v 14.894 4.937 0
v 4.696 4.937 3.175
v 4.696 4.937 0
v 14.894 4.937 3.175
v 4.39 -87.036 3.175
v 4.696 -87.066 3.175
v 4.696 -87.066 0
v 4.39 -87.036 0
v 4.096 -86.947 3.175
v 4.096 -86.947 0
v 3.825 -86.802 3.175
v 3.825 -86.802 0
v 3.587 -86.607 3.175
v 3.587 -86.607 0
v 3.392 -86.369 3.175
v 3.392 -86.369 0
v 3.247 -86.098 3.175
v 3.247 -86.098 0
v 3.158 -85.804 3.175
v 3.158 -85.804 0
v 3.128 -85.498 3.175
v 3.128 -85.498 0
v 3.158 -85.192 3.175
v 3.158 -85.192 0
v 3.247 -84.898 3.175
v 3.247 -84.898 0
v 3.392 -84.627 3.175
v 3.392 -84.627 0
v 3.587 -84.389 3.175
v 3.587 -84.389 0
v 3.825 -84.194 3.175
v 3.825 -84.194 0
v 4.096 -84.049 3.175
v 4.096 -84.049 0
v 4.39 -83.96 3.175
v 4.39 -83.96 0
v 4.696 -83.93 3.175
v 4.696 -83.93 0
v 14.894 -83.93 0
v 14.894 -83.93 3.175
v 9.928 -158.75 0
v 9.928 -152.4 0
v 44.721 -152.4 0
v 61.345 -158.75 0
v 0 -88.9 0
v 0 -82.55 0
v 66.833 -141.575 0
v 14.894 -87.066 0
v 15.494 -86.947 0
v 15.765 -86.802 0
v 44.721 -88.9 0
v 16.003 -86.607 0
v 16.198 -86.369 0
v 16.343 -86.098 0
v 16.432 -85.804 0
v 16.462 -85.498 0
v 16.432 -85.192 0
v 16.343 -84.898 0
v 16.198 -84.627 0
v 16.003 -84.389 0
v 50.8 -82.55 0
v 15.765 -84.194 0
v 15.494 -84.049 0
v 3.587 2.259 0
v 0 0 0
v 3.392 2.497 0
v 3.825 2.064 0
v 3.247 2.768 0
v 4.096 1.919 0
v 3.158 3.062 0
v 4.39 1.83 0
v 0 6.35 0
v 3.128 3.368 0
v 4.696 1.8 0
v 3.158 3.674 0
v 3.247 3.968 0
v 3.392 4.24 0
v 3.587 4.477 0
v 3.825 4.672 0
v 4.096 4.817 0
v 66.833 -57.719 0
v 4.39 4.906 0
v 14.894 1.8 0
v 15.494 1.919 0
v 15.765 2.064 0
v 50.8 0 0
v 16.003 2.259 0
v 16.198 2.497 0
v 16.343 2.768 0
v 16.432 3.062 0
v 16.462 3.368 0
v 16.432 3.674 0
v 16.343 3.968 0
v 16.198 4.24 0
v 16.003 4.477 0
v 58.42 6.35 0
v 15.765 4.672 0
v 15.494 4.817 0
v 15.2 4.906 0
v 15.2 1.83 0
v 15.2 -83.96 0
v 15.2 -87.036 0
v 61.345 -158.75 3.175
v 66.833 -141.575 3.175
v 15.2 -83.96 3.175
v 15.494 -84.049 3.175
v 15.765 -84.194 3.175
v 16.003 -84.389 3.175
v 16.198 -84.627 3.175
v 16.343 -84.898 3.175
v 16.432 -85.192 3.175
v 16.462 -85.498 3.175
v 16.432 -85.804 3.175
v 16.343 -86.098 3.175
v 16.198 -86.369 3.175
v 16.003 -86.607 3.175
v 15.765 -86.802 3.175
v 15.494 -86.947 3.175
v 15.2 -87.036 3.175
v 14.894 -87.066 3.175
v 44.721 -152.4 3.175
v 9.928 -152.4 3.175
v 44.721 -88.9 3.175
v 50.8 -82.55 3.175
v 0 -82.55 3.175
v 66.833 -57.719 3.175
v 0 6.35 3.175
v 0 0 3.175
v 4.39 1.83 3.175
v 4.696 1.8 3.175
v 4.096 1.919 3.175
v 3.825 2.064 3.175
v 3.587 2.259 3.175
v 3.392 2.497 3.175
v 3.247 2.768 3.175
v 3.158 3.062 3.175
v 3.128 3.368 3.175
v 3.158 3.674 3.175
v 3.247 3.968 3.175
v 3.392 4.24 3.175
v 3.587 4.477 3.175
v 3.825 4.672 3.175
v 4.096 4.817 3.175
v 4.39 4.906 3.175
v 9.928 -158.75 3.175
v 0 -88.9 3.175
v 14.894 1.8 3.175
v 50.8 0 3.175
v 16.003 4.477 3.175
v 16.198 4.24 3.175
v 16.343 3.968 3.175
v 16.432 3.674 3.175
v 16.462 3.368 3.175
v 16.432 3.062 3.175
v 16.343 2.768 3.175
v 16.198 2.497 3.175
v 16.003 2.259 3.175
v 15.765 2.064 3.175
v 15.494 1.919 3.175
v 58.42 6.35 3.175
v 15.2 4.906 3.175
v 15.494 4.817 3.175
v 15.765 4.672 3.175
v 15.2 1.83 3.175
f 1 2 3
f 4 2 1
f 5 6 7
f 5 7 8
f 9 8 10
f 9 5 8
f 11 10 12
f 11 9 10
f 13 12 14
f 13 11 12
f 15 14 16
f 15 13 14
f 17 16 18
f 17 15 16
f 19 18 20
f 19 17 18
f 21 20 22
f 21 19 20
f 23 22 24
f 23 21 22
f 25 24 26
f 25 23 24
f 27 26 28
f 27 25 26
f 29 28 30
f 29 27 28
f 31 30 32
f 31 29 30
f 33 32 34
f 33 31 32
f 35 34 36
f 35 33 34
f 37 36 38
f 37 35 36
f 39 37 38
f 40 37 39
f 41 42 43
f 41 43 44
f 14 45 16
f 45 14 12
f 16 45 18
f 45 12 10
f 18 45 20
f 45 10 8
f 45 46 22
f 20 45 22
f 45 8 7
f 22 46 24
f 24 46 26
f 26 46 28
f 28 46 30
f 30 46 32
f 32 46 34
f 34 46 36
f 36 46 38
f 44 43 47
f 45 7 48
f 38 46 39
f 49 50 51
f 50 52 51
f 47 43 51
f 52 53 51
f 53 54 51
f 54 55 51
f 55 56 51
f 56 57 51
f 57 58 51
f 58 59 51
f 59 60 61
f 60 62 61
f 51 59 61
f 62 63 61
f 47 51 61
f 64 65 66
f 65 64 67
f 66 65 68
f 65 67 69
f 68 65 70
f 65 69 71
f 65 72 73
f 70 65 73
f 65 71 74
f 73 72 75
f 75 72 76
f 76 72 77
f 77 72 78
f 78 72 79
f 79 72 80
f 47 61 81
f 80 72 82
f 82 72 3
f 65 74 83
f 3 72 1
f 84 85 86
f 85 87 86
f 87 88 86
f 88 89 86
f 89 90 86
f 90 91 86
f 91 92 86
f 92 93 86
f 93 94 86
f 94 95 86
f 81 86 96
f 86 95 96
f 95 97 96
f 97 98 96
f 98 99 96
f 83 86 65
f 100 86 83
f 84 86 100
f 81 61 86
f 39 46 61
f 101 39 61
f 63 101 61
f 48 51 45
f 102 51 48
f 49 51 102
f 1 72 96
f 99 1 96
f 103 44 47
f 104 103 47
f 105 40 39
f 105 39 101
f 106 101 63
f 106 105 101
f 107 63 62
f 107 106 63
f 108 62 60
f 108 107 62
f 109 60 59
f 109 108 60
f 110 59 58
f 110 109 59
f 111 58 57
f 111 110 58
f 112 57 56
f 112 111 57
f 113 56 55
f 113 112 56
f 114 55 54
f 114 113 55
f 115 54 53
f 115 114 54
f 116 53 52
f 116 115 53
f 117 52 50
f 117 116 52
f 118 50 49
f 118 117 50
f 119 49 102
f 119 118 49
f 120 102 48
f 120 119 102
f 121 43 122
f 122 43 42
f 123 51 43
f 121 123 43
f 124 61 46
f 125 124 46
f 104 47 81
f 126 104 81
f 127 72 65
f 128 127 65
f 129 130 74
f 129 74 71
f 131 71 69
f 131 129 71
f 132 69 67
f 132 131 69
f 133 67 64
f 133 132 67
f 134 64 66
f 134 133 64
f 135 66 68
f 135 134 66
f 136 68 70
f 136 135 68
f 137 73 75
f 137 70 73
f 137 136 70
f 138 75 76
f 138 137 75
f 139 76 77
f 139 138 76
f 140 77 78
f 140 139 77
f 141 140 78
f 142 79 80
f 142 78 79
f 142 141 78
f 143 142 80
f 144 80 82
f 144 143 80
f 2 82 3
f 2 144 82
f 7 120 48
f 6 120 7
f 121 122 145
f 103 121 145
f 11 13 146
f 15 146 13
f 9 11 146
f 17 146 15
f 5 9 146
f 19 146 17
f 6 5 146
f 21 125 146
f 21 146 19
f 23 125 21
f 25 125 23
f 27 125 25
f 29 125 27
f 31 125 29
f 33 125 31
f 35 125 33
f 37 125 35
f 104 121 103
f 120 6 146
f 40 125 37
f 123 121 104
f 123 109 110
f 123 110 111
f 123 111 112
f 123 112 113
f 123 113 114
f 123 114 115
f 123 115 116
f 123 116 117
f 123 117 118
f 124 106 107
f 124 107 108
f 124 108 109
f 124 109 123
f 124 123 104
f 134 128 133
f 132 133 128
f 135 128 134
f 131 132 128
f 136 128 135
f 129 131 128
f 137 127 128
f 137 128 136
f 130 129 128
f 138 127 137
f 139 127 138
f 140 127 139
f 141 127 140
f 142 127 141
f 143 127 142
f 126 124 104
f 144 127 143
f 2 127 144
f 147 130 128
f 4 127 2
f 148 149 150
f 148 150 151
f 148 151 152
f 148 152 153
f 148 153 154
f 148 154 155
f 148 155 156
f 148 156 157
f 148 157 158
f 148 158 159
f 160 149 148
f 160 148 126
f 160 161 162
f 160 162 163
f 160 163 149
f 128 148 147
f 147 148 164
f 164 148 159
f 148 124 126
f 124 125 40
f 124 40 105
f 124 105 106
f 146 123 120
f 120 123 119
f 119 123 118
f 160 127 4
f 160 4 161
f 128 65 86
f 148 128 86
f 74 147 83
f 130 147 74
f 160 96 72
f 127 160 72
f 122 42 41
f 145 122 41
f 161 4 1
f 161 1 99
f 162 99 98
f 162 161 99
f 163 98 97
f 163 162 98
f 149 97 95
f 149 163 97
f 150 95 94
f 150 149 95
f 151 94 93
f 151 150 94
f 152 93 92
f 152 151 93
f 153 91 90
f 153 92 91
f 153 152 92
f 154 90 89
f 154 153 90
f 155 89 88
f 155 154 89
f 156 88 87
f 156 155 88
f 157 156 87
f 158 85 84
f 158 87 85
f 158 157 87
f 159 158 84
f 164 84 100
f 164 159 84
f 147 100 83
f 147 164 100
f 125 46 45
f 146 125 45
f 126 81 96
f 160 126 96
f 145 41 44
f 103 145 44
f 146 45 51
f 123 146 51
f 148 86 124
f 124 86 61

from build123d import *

# Parameters (mm, degrees)
BOSS_EXTRUDE1_DEPTH = 3.175
CUT_EXTRUDE1_DEPTH  = 4.175


with BuildPart() as part:
    # Sketch1 → Boss-Extrude1 (new body)
    with BuildSketch(Plane.XY):
        Polygon((0, 0), (50.8, 0), (50.8, -82.55), (0, -82.55), (0, -88.9), (44.721203233, -88.9), (44.721203233, -152.4), (9.928151849, -152.4), (9.928151849, -158.75), (61.345154174, -158.75), (66.833453826, -141.575386567), (66.833453826, -57.719185396), (58.42, 6.35), (0, 6.35), align=None)
    extrude(amount=BOSS_EXTRUDE1_DEPTH)

    # Sketch2 → Cut-Extrude1 (cut, through all)
    with BuildSketch(Plane.XY.offset(3.175)):
        with BuildLine():
            Line((4.696138357, 4.936538246), (14.893802938, 4.936538246))
            ThreePointArc((14.893802938, 4.936538246), (16.462065142, 3.368276042), (14.893802938, 1.800013839))
            Line((14.893802938, 1.800013839), (4.696138357, 1.800013839))
            ThreePointArc((4.696138357, 1.800013839), (3.127876153, 3.368276042), (4.696138357, 4.936538246))
        make_face()
        with BuildLine():
            Line((4.696138357, -83.929673164), (14.893802938, -83.929673164))
            ThreePointArc((14.893802938, -83.929673164), (16.462065142, -85.497935368), (14.893802938, -87.066197572))
            Line((14.893802938, -87.066197572), (4.696138357, -87.066197572))
            ThreePointArc((4.696138357, -87.066197572), (3.127876153, -85.497935368), (4.696138357, -83.929673164))
        make_face()
    extrude(amount=-CUT_EXTRUDE1_DEPTH, mode=Mode.SUBTRACT)


solid = part.part
